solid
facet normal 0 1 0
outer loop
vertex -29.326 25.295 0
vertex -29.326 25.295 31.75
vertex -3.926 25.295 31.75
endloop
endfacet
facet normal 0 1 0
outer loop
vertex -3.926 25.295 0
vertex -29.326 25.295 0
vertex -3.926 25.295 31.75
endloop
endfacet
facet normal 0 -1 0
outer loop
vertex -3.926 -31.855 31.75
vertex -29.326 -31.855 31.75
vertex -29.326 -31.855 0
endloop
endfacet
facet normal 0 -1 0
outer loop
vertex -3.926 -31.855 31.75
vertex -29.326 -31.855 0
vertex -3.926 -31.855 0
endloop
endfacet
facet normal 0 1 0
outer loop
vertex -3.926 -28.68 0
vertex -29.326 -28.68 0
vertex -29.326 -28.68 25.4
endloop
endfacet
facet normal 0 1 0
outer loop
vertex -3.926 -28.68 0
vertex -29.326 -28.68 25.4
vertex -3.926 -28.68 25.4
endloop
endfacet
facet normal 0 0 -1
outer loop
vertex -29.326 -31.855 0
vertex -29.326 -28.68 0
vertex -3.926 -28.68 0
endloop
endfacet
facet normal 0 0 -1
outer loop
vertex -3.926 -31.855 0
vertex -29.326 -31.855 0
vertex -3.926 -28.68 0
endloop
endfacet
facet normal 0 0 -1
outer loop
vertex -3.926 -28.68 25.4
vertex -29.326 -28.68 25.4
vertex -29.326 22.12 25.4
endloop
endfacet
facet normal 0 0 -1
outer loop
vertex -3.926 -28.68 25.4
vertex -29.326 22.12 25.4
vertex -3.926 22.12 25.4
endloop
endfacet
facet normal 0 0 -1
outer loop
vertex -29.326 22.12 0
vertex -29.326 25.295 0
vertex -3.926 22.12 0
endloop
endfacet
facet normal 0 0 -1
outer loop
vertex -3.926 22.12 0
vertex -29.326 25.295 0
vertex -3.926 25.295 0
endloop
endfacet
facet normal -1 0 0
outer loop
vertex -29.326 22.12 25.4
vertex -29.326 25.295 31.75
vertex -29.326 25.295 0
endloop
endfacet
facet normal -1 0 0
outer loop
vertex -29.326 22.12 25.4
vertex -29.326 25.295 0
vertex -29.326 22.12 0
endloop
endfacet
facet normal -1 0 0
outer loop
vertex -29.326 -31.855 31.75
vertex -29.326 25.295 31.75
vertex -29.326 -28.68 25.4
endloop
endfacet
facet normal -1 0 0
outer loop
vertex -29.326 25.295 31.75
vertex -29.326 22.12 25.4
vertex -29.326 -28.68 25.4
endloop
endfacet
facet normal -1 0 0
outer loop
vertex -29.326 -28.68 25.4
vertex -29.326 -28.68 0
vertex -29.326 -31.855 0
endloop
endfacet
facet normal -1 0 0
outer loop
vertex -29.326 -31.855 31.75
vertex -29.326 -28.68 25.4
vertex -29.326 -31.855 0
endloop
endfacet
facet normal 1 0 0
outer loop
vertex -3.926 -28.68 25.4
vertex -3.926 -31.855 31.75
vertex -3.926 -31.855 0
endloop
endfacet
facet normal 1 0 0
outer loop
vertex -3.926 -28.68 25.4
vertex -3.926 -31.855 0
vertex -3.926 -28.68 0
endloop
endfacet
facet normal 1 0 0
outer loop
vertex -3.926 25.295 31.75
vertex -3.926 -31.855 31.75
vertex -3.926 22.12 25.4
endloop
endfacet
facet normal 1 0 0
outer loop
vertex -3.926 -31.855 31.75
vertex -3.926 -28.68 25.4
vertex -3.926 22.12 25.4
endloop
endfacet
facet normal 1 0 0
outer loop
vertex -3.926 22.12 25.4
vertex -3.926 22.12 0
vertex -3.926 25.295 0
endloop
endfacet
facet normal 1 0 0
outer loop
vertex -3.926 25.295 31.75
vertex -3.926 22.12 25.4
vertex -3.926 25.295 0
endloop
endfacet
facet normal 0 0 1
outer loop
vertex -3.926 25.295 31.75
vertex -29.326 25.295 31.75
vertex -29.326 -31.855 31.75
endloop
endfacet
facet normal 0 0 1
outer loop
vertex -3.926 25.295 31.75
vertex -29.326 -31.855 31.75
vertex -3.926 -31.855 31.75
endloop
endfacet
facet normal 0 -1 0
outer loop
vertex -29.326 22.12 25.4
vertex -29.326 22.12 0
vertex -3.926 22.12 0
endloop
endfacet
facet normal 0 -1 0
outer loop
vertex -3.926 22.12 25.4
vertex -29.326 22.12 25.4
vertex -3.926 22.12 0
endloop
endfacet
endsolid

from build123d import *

# Parameters (mm, degrees)
F0_W     = 25.4
F0_H     = 3.175
F0_H_2   = 50.8
F1_DEPTH = 31.75
F2_DEPTH = 25.4


with BuildPart() as f1:
    # F0 (on Top) → F1 (new body)
    with BuildSketch(Plane.XY):
        with Locations((-16.626253, 23.70746)):
            Rectangle(F0_W, F0_H)
        with Locations((-16.626253, -3.28004)):
            Rectangle(F0_W, F0_H_2)
        with Locations((-16.626253, -30.26754)):
            Rectangle(F0_W, F0_H)
    extrude(amount=F1_DEPTH)

    # F0 (on Top) → F2 (cut)
    with BuildSketch(Plane.XY):
        with Locations((-16.626253, -3.28004)):
            Rectangle(F0_W, F0_H_2)
    extrude(amount=F2_DEPTH, mode=Mode.SUBTRACT)


solid = f1.part
